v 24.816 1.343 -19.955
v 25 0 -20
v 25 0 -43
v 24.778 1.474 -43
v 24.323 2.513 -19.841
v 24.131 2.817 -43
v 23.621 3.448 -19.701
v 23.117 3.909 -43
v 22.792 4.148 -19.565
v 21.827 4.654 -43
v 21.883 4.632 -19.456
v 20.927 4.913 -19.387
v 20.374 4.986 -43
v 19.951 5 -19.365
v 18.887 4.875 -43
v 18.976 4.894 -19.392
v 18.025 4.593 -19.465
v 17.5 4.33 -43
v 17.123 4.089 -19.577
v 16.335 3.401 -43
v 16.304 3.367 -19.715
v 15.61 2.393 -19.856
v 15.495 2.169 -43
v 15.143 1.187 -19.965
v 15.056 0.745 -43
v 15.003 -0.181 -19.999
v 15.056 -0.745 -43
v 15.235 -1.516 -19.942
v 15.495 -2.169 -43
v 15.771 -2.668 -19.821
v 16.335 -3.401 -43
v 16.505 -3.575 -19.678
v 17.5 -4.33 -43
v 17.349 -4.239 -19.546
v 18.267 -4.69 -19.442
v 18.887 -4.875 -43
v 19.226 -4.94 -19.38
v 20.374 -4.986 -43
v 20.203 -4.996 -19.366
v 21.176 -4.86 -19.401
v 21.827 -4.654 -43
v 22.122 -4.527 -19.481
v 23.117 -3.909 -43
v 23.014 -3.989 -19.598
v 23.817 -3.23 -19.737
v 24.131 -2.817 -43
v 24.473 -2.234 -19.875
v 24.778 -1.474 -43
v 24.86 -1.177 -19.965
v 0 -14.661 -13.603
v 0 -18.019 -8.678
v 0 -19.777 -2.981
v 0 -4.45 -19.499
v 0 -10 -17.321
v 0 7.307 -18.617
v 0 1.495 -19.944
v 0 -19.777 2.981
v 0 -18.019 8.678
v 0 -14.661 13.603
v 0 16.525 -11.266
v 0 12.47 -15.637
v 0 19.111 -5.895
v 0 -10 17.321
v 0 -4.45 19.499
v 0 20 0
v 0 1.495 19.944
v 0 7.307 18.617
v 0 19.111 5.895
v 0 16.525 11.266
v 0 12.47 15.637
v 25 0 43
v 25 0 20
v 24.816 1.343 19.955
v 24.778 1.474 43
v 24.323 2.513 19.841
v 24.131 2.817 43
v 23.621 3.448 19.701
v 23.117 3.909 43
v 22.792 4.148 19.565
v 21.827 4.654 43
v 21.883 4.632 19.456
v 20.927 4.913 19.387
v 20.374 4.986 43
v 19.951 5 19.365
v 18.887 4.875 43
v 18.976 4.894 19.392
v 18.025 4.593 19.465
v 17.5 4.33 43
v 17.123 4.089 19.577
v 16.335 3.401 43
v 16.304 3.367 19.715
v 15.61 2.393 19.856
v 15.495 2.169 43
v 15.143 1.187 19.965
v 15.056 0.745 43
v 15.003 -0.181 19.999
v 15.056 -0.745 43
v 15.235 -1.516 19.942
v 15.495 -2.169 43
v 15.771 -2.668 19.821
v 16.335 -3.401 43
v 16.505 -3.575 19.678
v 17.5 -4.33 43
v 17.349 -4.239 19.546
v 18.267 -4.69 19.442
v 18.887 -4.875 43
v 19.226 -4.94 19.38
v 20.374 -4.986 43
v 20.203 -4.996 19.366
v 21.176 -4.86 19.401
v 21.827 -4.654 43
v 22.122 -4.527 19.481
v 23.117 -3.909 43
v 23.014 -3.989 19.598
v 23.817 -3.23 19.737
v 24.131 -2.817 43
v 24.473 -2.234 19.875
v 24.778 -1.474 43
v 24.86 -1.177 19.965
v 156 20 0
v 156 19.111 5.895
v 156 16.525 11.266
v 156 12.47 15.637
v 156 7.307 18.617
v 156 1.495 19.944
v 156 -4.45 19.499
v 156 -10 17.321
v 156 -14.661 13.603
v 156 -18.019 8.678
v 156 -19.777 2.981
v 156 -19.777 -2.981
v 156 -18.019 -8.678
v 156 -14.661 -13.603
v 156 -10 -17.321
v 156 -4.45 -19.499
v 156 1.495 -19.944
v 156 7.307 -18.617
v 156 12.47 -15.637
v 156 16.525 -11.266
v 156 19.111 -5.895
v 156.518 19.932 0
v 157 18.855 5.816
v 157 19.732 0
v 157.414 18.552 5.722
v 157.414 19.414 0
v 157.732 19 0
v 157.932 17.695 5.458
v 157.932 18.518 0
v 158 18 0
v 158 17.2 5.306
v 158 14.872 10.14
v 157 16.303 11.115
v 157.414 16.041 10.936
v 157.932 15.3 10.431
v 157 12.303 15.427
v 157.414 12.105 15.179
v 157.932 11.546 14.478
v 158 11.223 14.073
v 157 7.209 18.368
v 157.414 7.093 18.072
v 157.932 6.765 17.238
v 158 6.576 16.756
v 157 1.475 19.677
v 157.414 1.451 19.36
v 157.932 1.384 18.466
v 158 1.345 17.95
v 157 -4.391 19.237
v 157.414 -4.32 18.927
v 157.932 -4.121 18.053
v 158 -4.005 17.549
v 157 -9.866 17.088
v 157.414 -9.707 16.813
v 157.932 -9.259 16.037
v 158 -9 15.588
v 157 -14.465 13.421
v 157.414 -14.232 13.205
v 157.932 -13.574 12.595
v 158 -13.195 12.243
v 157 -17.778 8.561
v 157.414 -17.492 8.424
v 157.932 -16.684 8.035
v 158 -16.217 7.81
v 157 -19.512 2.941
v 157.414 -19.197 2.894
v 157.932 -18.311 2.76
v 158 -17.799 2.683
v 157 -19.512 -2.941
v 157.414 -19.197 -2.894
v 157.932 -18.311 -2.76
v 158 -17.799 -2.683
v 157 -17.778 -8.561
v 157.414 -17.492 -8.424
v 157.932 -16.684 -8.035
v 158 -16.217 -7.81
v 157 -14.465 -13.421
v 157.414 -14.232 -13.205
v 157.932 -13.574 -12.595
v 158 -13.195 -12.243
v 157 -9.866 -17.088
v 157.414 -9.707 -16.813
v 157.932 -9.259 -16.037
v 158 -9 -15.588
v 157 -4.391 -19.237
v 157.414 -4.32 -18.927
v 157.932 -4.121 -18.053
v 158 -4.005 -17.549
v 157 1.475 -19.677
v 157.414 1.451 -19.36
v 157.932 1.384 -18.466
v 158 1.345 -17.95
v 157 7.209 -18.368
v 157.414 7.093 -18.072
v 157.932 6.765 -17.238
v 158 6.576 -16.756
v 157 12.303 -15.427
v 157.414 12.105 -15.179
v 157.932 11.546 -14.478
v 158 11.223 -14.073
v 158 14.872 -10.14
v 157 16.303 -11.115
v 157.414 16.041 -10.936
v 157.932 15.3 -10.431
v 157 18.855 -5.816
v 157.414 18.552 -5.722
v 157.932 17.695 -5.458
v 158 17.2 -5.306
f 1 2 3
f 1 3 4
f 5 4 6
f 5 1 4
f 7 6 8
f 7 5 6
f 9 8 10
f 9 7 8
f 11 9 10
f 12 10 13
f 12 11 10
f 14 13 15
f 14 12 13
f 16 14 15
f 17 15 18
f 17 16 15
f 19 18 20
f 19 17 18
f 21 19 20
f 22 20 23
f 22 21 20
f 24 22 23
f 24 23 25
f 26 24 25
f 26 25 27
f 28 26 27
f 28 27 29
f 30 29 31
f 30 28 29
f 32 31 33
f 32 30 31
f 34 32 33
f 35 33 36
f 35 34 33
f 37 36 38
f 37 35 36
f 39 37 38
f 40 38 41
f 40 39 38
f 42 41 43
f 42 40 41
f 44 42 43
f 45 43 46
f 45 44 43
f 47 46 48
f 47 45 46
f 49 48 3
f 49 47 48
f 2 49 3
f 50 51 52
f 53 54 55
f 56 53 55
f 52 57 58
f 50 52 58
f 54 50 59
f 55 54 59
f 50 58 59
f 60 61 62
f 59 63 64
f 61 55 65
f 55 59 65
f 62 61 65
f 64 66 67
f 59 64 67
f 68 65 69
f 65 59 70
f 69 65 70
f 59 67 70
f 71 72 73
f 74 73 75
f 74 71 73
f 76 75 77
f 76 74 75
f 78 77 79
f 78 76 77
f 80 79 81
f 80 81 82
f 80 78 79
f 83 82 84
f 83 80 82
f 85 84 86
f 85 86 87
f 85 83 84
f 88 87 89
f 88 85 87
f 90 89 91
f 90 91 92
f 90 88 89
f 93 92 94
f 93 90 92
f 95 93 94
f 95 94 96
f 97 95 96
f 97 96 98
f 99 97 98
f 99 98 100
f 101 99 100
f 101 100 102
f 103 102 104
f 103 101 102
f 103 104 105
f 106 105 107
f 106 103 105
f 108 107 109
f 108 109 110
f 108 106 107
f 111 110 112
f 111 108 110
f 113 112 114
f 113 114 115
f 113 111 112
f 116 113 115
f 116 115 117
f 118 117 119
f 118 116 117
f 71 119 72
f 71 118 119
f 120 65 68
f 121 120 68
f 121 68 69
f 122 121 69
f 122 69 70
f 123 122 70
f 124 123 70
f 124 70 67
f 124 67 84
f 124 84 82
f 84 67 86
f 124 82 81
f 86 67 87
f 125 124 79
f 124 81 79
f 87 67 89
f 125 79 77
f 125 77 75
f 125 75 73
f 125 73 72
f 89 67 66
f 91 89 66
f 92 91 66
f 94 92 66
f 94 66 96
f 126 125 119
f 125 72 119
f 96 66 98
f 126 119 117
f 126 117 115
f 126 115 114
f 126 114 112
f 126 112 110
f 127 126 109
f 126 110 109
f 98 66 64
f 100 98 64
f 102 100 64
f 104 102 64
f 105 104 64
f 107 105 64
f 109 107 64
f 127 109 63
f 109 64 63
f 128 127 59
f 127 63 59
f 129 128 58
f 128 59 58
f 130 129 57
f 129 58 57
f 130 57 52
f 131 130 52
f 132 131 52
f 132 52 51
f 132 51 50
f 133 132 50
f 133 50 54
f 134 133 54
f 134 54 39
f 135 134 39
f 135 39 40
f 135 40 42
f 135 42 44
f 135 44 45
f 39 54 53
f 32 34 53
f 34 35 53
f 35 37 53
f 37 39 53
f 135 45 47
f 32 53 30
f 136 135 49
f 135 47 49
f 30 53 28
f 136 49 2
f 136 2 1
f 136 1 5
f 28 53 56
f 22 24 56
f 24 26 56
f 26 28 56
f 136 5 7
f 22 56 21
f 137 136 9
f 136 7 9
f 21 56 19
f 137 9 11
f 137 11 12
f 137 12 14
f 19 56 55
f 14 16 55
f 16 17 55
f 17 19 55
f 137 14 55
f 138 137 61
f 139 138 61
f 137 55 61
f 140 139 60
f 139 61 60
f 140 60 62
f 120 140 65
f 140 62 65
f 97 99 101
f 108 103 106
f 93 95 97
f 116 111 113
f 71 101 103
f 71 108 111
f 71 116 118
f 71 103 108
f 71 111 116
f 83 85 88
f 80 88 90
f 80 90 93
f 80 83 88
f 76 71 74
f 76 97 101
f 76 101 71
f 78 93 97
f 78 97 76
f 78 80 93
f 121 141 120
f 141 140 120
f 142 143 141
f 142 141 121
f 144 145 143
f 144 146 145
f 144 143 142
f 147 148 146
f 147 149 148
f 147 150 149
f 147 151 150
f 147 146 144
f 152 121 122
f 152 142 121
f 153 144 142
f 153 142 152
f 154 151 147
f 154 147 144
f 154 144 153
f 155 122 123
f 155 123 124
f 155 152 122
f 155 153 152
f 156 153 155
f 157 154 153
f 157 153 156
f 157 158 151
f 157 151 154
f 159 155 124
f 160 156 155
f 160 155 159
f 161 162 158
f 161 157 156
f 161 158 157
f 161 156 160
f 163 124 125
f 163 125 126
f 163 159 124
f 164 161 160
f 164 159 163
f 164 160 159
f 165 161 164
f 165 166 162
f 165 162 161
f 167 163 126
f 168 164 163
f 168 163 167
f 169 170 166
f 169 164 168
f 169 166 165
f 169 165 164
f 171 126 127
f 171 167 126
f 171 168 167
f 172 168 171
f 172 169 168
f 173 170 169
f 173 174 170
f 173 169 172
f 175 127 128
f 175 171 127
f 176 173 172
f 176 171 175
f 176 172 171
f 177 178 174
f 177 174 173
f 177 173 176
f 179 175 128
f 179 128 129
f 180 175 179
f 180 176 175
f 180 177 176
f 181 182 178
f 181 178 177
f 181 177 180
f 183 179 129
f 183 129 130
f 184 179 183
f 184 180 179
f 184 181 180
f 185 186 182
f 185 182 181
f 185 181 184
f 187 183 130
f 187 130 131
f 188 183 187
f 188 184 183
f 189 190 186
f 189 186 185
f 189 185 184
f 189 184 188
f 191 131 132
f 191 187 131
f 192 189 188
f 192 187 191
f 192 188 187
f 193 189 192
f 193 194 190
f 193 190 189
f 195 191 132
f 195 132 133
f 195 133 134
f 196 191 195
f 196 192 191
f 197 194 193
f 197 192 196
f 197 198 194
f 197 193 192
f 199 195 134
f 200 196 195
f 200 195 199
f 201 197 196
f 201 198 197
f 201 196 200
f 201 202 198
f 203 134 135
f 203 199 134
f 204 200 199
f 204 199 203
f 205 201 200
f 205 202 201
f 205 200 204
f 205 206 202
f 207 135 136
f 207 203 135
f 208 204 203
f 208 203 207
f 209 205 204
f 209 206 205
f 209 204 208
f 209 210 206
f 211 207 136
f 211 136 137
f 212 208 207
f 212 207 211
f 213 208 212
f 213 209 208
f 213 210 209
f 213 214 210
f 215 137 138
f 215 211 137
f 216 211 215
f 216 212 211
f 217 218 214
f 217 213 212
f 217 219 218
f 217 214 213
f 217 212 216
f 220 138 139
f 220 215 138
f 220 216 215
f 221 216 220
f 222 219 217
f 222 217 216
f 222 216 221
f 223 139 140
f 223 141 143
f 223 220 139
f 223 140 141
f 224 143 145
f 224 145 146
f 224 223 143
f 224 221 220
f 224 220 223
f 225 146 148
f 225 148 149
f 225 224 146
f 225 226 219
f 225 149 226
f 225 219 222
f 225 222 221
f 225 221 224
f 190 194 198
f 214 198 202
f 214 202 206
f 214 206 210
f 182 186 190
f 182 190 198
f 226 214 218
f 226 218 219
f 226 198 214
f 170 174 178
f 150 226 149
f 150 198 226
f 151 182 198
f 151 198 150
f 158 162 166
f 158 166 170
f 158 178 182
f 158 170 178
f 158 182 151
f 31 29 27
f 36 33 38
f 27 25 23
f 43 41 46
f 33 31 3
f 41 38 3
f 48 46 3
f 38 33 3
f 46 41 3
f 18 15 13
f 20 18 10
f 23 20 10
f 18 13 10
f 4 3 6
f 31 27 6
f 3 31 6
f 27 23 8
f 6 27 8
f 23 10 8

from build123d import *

# Parameters (mm, degrees)
F0_R     = 20
F1_DEPTH = 158
F2_R     = 5
F3_DEPTH = 43
F4_R     = 2


with BuildPart() as f1:
    # F0 (on Right) → F1 (new body)
    with BuildSketch(Plane.YZ):
        Circle(F0_R)
    extrude(amount=F1_DEPTH)

    # F2 (on Top) → F3 (join, symmetric)
    with BuildSketch(Plane.XY):
        with Locations((20, 0)):
            Circle(F2_R)
    extrude(amount=F3_DEPTH, both=True)

    # F4
    f4_edges = [f1.edges().sort_by_distance(p)[0] for p in [
        (158, -20, 0),
    ]]
    fillet(f4_edges, radius=F4_R)


solid = f1.part
